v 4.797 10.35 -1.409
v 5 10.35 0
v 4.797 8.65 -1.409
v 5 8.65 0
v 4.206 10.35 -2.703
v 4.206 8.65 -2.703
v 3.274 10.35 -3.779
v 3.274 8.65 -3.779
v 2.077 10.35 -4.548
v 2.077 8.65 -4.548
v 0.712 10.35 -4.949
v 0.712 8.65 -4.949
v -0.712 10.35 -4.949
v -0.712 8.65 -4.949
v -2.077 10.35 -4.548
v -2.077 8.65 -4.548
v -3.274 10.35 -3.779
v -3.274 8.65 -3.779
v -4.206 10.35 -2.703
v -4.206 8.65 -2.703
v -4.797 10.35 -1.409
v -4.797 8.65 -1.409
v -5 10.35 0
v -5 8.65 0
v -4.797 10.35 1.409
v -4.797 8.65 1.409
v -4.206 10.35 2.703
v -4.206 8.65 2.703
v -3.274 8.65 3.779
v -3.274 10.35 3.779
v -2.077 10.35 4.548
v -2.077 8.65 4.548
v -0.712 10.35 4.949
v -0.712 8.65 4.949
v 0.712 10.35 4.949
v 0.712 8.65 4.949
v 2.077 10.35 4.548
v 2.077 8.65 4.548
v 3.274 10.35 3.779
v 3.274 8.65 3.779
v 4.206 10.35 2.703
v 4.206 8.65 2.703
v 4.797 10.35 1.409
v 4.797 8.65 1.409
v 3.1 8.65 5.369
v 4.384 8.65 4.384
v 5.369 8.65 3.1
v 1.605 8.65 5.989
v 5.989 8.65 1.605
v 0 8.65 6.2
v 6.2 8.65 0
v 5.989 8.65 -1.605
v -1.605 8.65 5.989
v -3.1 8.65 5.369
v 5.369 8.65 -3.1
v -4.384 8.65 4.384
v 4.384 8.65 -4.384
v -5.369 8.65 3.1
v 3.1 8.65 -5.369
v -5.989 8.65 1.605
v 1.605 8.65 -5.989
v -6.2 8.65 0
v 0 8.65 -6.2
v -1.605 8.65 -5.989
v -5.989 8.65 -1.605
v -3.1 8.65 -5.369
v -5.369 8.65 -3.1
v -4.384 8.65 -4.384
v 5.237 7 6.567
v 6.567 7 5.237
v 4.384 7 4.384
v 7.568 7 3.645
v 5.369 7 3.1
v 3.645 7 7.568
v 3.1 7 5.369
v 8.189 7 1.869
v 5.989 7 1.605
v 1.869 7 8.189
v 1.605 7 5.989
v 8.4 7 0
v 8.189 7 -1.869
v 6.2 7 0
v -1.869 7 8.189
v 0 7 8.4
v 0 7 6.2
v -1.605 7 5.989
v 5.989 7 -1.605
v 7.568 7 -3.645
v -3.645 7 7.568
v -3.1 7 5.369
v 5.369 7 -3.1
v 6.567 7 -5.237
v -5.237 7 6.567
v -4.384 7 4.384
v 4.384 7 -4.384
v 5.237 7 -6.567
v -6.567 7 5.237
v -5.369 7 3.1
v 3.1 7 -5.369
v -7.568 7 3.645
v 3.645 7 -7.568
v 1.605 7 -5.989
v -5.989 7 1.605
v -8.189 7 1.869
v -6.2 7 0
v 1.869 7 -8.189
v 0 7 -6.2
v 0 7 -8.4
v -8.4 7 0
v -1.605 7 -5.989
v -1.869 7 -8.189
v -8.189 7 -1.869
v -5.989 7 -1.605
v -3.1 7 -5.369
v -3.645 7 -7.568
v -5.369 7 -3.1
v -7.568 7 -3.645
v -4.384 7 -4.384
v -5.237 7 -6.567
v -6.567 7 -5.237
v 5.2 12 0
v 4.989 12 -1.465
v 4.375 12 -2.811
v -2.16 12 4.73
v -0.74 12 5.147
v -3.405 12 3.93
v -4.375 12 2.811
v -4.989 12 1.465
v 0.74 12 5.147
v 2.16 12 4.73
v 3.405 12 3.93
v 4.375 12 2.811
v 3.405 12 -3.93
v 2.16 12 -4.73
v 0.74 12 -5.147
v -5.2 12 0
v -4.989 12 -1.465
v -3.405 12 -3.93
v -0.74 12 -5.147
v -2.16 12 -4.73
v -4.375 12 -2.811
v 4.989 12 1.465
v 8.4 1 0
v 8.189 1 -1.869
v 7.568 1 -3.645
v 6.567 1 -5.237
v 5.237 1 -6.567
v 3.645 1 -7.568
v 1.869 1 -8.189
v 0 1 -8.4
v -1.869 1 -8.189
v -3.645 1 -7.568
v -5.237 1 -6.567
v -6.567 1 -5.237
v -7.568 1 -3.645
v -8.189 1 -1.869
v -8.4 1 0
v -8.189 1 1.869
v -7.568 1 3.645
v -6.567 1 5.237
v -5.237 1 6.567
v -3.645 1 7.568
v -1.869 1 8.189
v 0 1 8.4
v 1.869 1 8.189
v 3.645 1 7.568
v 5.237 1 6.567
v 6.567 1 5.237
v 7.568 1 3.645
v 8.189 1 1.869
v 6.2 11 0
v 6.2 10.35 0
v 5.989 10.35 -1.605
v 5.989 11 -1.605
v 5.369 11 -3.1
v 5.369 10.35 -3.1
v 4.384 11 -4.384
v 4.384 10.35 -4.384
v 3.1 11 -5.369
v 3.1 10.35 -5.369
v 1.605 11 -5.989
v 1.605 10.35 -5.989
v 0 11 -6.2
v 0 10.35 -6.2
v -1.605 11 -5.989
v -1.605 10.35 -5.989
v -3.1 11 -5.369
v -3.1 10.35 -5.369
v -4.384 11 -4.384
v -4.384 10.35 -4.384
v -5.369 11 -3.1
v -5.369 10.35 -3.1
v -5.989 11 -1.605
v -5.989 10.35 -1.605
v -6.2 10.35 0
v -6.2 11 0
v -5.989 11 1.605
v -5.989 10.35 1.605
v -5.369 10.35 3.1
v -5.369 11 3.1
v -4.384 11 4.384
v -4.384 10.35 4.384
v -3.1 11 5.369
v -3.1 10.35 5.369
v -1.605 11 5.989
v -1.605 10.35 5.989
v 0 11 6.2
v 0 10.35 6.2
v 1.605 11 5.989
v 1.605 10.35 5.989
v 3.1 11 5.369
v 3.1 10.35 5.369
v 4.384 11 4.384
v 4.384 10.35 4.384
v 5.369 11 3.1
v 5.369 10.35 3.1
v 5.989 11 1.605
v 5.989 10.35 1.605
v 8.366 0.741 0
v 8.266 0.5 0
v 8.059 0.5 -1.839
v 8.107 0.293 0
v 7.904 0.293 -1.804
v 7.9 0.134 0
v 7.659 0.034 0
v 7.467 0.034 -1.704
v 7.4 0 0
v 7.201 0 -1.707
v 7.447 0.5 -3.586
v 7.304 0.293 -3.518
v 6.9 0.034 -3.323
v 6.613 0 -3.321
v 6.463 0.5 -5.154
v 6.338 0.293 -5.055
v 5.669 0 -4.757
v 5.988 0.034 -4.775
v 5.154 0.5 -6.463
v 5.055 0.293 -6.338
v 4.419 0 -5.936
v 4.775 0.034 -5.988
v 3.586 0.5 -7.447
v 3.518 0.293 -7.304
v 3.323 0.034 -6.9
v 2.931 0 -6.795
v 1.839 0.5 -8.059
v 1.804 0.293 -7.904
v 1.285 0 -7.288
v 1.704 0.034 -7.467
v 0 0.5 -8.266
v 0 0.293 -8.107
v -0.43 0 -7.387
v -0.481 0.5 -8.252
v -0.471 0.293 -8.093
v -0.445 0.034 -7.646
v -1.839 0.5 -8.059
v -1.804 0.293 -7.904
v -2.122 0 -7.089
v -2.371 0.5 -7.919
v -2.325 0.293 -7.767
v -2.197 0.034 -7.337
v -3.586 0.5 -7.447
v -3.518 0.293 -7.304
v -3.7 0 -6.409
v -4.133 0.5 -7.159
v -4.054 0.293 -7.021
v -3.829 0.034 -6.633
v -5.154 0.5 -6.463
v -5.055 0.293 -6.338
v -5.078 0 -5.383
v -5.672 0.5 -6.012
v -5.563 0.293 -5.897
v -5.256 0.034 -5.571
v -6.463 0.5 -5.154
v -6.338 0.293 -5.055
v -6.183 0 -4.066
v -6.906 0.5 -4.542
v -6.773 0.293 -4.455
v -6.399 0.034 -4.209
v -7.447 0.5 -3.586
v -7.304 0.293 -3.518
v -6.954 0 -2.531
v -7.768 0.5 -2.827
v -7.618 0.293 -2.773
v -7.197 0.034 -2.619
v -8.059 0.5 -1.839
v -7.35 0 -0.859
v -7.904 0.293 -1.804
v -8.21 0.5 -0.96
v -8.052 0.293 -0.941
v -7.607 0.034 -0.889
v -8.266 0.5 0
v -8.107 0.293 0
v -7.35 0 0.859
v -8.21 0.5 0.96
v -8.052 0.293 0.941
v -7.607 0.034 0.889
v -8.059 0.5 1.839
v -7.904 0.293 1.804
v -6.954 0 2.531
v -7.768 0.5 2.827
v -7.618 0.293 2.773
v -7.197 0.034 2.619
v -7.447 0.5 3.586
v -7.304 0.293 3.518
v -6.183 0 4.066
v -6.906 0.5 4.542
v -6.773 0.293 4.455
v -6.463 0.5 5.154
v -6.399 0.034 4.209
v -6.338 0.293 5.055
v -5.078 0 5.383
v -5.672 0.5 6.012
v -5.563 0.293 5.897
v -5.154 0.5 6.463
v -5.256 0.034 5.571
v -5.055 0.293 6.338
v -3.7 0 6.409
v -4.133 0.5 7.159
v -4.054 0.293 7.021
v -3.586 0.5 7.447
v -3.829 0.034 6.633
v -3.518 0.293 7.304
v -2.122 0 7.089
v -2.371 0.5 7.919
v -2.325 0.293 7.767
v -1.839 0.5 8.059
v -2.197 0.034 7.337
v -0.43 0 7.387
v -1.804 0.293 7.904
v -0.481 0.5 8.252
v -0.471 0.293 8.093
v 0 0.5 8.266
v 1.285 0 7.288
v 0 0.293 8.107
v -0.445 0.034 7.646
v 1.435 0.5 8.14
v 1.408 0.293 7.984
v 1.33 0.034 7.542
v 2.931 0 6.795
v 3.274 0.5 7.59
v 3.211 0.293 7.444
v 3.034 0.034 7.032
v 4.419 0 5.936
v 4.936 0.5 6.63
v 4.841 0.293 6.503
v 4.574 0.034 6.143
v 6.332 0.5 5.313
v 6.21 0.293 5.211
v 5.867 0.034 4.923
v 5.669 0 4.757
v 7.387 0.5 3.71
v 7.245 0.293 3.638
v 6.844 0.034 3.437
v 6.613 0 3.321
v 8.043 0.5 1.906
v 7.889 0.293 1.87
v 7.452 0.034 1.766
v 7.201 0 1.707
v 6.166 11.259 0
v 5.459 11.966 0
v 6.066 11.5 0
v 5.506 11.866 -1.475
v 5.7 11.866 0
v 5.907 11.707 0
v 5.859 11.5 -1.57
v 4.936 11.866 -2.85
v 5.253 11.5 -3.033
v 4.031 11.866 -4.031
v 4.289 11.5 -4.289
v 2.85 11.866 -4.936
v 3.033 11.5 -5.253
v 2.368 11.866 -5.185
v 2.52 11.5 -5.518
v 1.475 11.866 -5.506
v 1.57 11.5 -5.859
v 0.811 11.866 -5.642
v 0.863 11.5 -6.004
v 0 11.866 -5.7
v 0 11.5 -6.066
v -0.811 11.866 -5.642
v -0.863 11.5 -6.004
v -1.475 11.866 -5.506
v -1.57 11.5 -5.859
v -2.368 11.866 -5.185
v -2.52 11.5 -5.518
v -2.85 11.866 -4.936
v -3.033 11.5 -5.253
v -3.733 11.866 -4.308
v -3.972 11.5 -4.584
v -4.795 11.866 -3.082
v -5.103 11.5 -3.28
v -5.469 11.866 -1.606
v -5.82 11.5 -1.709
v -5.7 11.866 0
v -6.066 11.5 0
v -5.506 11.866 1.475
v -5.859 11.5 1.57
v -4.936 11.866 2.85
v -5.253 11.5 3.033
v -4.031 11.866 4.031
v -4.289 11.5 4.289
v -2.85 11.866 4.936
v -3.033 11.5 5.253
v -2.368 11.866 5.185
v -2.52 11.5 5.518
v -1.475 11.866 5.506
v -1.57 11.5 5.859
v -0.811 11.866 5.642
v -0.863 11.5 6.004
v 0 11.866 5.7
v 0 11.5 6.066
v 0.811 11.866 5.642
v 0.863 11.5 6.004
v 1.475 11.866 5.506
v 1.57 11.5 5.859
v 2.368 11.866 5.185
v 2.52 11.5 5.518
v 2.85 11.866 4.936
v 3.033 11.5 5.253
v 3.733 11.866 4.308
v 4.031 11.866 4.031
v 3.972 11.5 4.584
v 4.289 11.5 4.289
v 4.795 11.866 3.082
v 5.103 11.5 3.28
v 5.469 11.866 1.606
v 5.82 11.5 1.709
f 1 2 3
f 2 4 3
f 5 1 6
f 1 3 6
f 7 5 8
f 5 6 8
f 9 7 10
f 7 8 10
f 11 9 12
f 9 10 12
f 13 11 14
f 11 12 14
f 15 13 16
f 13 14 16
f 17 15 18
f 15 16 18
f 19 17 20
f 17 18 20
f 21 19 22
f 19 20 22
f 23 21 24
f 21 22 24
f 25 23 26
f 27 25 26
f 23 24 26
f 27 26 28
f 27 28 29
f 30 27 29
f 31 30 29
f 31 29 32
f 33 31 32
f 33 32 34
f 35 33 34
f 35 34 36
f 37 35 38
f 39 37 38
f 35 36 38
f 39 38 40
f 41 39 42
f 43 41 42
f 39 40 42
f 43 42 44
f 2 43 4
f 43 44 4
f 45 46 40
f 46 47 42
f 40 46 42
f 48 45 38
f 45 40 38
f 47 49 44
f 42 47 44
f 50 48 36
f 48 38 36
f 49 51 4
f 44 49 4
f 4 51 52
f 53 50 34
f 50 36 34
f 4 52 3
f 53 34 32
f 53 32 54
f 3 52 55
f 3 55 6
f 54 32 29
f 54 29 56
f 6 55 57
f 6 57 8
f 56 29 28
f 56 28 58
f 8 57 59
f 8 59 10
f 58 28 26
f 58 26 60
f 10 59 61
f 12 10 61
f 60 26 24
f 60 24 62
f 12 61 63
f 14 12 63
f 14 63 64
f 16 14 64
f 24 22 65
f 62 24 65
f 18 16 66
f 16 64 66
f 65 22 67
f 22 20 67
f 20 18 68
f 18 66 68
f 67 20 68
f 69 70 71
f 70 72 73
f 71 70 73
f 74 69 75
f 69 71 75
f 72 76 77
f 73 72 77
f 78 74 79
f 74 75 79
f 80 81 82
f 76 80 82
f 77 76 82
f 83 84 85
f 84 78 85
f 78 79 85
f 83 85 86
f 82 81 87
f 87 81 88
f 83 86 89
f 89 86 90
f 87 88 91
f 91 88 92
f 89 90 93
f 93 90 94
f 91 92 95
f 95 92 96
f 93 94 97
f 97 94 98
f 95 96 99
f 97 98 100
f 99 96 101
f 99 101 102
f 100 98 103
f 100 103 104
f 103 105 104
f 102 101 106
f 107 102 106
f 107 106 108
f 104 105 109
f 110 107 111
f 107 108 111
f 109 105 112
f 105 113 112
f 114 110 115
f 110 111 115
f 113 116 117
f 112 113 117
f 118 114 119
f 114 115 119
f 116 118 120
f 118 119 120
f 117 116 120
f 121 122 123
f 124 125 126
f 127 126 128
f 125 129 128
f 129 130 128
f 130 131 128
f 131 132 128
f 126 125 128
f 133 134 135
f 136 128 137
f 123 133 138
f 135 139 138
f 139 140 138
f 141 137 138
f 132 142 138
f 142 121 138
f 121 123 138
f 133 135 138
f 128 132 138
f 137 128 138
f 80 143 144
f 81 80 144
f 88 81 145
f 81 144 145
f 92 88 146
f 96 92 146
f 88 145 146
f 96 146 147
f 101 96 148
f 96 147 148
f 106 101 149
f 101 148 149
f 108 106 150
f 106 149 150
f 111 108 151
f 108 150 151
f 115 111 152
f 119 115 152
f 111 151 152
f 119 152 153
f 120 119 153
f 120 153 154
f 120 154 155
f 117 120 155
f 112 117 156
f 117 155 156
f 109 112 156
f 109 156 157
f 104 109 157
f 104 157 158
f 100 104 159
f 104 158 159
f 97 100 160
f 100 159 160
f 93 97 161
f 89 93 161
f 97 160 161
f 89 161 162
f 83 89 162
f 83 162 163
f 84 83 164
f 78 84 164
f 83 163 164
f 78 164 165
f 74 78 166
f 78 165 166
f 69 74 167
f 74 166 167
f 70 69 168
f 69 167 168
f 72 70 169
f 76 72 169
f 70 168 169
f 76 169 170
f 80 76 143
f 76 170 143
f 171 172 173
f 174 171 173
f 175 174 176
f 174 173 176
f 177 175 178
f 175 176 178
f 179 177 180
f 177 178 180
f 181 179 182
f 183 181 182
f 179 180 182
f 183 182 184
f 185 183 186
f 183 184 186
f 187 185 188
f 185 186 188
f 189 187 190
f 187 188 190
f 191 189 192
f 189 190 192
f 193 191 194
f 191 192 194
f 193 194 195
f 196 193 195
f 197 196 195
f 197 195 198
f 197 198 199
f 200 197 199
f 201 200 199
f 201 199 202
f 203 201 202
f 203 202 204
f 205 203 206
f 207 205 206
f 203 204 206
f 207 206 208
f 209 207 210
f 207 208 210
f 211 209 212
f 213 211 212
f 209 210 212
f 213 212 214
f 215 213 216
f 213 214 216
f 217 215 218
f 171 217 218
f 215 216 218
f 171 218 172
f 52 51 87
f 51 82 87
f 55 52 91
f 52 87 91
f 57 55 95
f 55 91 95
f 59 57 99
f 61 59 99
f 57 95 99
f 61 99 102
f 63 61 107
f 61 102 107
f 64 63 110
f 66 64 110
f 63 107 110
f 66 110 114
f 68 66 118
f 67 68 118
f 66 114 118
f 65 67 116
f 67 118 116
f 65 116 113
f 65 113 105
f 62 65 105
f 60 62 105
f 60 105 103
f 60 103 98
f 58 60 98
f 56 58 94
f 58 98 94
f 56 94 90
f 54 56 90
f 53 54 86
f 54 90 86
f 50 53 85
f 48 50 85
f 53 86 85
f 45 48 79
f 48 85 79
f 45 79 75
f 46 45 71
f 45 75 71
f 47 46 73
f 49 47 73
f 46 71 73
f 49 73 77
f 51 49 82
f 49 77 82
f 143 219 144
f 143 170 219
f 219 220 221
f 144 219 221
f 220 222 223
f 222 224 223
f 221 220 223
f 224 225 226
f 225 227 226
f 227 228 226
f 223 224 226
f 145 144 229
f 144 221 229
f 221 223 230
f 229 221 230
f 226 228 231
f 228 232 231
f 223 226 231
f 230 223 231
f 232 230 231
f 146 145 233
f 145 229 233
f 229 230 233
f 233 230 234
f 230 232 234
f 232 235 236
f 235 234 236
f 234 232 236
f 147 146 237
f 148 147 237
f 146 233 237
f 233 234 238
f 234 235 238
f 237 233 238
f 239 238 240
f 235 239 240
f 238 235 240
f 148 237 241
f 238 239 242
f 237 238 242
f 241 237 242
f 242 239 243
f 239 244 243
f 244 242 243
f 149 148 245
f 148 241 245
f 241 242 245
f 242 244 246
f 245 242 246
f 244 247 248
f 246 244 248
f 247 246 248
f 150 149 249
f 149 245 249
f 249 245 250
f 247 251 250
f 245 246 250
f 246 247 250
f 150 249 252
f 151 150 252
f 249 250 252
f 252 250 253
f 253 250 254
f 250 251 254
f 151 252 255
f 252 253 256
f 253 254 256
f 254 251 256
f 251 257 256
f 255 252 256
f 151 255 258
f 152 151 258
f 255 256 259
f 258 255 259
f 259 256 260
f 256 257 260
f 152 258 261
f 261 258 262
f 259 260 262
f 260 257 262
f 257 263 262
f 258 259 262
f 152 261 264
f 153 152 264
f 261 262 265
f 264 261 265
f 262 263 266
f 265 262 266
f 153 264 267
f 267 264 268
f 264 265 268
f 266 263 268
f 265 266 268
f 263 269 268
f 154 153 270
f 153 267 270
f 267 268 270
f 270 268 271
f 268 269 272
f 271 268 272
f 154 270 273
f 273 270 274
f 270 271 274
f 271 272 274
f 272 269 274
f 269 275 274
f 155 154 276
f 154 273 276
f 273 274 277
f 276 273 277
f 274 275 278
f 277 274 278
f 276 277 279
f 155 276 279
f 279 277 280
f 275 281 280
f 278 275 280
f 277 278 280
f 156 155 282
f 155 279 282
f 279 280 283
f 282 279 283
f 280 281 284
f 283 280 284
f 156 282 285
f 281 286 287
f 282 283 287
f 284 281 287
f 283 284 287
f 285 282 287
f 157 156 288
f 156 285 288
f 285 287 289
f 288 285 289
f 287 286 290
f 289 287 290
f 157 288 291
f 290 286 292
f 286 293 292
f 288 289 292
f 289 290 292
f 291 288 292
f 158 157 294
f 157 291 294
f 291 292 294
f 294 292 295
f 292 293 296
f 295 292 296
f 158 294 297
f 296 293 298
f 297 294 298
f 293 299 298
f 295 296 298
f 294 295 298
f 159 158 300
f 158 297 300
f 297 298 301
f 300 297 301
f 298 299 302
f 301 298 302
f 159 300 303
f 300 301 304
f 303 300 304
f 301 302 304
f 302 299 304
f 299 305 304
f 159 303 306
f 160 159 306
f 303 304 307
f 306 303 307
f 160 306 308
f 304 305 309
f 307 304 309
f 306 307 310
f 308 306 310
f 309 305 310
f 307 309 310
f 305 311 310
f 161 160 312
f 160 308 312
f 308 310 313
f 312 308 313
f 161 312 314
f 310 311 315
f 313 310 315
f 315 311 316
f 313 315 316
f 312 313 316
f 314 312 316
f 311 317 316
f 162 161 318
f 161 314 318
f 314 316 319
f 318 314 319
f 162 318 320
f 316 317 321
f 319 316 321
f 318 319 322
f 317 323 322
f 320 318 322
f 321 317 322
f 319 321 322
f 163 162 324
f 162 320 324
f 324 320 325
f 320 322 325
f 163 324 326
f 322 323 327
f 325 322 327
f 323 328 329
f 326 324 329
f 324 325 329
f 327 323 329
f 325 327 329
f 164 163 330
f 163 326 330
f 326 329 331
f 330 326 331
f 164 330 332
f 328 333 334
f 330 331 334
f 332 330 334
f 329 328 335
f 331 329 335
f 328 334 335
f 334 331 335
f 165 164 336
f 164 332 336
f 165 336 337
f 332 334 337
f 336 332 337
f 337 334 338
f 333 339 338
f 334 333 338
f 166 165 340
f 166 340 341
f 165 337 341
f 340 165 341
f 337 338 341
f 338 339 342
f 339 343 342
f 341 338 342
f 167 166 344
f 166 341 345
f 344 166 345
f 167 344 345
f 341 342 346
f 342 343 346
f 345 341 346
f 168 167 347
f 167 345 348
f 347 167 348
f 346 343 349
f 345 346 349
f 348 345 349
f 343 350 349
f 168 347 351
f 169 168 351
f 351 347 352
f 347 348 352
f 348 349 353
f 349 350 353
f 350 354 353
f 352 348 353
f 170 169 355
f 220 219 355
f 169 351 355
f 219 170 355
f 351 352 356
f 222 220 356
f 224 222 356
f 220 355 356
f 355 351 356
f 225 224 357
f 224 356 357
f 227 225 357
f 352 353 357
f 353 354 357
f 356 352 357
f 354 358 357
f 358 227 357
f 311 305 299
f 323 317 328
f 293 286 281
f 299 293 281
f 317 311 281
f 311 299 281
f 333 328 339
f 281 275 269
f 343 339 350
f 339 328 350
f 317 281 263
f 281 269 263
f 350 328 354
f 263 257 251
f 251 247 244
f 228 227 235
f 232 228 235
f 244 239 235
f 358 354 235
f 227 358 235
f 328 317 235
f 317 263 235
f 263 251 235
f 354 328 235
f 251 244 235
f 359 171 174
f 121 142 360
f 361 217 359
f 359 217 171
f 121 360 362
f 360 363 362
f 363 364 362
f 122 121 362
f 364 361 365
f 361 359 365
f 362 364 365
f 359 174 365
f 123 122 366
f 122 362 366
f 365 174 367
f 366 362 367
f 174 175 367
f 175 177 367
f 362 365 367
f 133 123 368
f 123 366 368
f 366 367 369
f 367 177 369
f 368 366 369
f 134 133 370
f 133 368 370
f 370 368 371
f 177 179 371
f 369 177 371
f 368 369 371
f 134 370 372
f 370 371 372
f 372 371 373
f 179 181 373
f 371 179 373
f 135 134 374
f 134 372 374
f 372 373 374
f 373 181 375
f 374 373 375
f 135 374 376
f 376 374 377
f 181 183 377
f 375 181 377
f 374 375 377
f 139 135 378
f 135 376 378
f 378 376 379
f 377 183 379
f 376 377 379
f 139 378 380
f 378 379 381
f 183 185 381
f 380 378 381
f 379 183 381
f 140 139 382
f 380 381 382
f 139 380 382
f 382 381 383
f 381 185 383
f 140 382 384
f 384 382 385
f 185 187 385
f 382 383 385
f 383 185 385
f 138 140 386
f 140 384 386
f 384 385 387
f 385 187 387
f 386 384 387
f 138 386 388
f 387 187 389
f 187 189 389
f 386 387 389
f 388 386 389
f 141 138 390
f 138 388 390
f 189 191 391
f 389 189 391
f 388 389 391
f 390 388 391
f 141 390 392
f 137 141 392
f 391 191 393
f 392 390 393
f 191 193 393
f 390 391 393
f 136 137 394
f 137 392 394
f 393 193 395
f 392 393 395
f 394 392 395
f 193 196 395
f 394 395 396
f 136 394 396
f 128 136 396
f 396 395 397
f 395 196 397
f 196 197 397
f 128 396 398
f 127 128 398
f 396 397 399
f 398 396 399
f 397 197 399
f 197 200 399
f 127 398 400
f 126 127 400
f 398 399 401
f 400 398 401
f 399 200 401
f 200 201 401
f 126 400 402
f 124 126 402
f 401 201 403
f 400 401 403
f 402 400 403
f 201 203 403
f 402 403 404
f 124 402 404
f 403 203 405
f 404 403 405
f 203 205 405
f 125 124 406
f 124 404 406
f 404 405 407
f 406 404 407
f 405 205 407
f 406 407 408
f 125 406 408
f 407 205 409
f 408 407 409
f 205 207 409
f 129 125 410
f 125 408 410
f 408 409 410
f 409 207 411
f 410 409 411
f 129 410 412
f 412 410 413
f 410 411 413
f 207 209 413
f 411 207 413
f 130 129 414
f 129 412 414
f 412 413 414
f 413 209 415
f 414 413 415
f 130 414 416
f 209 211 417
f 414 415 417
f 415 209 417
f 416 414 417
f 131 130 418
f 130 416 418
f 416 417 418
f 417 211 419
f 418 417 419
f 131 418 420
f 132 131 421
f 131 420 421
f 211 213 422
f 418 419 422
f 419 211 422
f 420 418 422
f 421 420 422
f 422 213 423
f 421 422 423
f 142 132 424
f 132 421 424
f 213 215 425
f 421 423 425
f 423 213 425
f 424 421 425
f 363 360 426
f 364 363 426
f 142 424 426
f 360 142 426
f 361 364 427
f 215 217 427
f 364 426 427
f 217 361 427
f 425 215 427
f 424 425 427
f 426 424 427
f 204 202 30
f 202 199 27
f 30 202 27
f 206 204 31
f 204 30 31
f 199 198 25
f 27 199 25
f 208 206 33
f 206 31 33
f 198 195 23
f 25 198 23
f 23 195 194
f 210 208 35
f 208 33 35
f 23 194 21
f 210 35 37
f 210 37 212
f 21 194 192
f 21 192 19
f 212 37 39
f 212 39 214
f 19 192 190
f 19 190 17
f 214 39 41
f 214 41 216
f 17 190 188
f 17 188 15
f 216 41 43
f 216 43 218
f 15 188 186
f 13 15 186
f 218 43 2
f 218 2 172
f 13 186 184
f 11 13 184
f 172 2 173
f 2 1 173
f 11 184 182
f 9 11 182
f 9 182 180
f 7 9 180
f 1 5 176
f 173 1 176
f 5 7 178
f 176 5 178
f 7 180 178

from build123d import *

# Parameters (mm, degrees)
FILLET1_R = 1
FILLET2_R = 1


with BuildPart() as part:
    # Sketch1 → Revolve1 (revolve)
    with BuildSketch(Plane.XY):
        Polygon((0, 0), (0, 12), (6.2, 12), (6.2, 10.35), (5, 10.35), (5, 8.65), (6.2, 8.65), (6.2, 7), (8.4, 7), (8.4, 0), align=None)
    revolve(axis=Axis((0, 0, 0), (0, 1, 0)))

    # Fillet1
    fillet1_edges = [part.edges().sort_by_distance(p)[0] for p in [
        (-6.2, 12, 0),
    ]]
    fillet(fillet1_edges, radius=FILLET1_R)

    # Fillet2
    fillet2_edges = [part.edges().sort_by_distance(p)[0] for p in [
        (-8.4, 0, 0),
    ]]
    fillet(fillet2_edges, radius=FILLET2_R)


solid = part.part
